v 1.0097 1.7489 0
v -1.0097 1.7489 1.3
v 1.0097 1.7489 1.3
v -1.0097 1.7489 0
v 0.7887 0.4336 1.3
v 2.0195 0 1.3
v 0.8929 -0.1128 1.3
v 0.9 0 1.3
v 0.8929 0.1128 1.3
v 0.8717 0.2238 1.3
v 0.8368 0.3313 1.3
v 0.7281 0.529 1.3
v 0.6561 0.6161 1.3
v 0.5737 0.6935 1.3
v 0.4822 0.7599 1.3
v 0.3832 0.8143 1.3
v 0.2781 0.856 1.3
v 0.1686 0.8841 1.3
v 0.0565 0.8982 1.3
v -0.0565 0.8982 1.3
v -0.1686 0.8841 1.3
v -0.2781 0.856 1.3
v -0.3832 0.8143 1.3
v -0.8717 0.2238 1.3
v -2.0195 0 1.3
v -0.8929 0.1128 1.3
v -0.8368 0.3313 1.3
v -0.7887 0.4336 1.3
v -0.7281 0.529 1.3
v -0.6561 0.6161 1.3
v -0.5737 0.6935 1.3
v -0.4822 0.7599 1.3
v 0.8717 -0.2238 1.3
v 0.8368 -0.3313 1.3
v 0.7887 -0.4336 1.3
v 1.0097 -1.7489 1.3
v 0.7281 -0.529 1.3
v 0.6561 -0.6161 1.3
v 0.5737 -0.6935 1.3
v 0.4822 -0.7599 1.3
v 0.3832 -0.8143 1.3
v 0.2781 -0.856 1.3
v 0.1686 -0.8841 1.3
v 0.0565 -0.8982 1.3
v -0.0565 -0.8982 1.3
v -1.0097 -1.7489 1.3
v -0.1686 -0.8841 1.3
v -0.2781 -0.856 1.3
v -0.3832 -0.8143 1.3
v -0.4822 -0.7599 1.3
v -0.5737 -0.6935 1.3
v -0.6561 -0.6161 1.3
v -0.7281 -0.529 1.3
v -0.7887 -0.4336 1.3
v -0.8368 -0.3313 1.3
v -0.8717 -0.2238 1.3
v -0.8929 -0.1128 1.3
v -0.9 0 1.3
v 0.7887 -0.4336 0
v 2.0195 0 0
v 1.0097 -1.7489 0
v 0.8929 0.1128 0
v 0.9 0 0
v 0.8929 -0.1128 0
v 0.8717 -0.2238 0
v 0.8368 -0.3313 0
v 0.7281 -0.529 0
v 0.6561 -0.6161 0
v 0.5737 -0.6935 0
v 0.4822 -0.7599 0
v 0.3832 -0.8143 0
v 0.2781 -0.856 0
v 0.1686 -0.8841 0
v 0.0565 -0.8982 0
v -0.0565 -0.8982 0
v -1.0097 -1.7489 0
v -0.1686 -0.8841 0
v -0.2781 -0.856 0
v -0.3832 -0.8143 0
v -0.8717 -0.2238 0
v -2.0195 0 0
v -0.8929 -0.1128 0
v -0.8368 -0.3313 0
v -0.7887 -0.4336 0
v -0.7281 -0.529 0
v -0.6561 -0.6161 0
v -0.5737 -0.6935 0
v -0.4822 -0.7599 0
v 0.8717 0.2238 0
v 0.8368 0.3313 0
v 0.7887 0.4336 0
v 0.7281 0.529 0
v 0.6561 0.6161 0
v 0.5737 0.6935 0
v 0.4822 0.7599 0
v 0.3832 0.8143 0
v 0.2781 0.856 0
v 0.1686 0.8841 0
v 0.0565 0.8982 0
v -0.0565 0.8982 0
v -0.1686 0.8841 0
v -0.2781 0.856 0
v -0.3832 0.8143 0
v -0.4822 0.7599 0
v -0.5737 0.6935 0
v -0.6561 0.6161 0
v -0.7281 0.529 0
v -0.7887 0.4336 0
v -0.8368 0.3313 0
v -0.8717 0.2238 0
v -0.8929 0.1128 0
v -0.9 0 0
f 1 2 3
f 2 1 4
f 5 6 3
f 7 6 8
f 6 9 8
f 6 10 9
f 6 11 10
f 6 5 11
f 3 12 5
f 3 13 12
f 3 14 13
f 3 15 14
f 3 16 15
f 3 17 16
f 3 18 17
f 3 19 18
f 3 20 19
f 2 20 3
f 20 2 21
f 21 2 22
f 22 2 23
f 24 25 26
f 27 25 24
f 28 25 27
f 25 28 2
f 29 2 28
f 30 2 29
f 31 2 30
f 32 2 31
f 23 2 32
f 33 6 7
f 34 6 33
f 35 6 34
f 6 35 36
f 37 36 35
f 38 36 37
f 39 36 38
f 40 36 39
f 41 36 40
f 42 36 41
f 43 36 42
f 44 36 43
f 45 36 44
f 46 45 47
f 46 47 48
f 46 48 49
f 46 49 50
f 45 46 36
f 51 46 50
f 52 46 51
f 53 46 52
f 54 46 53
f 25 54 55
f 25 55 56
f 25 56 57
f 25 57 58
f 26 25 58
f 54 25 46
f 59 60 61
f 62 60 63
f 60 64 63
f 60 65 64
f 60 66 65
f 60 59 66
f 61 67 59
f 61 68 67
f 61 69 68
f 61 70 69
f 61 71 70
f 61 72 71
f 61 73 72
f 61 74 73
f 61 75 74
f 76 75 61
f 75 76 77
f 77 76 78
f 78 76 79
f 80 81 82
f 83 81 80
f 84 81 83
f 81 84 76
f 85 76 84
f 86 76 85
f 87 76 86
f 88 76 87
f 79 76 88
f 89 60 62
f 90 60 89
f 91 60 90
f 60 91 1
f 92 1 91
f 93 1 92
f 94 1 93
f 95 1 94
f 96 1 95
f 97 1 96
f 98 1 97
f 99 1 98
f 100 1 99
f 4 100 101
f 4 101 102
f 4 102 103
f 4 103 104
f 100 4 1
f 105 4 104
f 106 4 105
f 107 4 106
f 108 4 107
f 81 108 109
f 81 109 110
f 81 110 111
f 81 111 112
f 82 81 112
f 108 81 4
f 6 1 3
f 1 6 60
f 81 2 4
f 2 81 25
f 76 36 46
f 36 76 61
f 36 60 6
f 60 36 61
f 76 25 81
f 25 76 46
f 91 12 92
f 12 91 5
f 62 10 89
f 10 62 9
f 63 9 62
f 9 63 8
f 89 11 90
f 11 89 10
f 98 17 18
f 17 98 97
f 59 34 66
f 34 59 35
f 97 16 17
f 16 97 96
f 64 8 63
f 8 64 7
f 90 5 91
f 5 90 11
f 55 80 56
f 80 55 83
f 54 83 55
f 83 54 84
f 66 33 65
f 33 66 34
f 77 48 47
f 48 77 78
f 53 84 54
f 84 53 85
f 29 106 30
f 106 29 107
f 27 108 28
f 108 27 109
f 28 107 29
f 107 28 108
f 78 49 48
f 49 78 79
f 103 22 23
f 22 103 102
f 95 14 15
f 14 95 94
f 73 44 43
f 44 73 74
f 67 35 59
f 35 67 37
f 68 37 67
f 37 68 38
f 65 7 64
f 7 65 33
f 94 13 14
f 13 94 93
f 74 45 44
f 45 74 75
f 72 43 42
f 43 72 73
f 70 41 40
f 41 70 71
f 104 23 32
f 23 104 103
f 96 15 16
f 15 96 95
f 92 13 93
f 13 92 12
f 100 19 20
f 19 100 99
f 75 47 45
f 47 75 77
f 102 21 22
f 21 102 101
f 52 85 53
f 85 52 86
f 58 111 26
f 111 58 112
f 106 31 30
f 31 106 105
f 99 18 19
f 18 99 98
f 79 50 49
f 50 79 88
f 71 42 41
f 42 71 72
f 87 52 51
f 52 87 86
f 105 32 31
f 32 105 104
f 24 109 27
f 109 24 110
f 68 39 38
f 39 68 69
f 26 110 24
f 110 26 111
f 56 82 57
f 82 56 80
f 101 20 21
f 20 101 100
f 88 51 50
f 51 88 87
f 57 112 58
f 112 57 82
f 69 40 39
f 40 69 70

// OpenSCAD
$fn = 50;


difference() {
	union() {
		translate(v = [0, 0, 0]) {
			rotate(a = [0, 0, 0]) {
				difference() {
					union() {
						linear_extrude(height = 1.3000000000) {
							polygon(points = [[2.0195000000, 0.0000000000], [1.0097500000, 1.7489383029], [-1.0097500000, 1.7489383029], [-2.0195000000, 0.0000000000], [-1.0097500000, -1.7489383029], [1.0097500000, -1.7489383029]]);
						}
					}
					union();
				}
			}
		}
	}
	union() {
		cylinder(h = 100, r = 0.9000000000);
	}
}
